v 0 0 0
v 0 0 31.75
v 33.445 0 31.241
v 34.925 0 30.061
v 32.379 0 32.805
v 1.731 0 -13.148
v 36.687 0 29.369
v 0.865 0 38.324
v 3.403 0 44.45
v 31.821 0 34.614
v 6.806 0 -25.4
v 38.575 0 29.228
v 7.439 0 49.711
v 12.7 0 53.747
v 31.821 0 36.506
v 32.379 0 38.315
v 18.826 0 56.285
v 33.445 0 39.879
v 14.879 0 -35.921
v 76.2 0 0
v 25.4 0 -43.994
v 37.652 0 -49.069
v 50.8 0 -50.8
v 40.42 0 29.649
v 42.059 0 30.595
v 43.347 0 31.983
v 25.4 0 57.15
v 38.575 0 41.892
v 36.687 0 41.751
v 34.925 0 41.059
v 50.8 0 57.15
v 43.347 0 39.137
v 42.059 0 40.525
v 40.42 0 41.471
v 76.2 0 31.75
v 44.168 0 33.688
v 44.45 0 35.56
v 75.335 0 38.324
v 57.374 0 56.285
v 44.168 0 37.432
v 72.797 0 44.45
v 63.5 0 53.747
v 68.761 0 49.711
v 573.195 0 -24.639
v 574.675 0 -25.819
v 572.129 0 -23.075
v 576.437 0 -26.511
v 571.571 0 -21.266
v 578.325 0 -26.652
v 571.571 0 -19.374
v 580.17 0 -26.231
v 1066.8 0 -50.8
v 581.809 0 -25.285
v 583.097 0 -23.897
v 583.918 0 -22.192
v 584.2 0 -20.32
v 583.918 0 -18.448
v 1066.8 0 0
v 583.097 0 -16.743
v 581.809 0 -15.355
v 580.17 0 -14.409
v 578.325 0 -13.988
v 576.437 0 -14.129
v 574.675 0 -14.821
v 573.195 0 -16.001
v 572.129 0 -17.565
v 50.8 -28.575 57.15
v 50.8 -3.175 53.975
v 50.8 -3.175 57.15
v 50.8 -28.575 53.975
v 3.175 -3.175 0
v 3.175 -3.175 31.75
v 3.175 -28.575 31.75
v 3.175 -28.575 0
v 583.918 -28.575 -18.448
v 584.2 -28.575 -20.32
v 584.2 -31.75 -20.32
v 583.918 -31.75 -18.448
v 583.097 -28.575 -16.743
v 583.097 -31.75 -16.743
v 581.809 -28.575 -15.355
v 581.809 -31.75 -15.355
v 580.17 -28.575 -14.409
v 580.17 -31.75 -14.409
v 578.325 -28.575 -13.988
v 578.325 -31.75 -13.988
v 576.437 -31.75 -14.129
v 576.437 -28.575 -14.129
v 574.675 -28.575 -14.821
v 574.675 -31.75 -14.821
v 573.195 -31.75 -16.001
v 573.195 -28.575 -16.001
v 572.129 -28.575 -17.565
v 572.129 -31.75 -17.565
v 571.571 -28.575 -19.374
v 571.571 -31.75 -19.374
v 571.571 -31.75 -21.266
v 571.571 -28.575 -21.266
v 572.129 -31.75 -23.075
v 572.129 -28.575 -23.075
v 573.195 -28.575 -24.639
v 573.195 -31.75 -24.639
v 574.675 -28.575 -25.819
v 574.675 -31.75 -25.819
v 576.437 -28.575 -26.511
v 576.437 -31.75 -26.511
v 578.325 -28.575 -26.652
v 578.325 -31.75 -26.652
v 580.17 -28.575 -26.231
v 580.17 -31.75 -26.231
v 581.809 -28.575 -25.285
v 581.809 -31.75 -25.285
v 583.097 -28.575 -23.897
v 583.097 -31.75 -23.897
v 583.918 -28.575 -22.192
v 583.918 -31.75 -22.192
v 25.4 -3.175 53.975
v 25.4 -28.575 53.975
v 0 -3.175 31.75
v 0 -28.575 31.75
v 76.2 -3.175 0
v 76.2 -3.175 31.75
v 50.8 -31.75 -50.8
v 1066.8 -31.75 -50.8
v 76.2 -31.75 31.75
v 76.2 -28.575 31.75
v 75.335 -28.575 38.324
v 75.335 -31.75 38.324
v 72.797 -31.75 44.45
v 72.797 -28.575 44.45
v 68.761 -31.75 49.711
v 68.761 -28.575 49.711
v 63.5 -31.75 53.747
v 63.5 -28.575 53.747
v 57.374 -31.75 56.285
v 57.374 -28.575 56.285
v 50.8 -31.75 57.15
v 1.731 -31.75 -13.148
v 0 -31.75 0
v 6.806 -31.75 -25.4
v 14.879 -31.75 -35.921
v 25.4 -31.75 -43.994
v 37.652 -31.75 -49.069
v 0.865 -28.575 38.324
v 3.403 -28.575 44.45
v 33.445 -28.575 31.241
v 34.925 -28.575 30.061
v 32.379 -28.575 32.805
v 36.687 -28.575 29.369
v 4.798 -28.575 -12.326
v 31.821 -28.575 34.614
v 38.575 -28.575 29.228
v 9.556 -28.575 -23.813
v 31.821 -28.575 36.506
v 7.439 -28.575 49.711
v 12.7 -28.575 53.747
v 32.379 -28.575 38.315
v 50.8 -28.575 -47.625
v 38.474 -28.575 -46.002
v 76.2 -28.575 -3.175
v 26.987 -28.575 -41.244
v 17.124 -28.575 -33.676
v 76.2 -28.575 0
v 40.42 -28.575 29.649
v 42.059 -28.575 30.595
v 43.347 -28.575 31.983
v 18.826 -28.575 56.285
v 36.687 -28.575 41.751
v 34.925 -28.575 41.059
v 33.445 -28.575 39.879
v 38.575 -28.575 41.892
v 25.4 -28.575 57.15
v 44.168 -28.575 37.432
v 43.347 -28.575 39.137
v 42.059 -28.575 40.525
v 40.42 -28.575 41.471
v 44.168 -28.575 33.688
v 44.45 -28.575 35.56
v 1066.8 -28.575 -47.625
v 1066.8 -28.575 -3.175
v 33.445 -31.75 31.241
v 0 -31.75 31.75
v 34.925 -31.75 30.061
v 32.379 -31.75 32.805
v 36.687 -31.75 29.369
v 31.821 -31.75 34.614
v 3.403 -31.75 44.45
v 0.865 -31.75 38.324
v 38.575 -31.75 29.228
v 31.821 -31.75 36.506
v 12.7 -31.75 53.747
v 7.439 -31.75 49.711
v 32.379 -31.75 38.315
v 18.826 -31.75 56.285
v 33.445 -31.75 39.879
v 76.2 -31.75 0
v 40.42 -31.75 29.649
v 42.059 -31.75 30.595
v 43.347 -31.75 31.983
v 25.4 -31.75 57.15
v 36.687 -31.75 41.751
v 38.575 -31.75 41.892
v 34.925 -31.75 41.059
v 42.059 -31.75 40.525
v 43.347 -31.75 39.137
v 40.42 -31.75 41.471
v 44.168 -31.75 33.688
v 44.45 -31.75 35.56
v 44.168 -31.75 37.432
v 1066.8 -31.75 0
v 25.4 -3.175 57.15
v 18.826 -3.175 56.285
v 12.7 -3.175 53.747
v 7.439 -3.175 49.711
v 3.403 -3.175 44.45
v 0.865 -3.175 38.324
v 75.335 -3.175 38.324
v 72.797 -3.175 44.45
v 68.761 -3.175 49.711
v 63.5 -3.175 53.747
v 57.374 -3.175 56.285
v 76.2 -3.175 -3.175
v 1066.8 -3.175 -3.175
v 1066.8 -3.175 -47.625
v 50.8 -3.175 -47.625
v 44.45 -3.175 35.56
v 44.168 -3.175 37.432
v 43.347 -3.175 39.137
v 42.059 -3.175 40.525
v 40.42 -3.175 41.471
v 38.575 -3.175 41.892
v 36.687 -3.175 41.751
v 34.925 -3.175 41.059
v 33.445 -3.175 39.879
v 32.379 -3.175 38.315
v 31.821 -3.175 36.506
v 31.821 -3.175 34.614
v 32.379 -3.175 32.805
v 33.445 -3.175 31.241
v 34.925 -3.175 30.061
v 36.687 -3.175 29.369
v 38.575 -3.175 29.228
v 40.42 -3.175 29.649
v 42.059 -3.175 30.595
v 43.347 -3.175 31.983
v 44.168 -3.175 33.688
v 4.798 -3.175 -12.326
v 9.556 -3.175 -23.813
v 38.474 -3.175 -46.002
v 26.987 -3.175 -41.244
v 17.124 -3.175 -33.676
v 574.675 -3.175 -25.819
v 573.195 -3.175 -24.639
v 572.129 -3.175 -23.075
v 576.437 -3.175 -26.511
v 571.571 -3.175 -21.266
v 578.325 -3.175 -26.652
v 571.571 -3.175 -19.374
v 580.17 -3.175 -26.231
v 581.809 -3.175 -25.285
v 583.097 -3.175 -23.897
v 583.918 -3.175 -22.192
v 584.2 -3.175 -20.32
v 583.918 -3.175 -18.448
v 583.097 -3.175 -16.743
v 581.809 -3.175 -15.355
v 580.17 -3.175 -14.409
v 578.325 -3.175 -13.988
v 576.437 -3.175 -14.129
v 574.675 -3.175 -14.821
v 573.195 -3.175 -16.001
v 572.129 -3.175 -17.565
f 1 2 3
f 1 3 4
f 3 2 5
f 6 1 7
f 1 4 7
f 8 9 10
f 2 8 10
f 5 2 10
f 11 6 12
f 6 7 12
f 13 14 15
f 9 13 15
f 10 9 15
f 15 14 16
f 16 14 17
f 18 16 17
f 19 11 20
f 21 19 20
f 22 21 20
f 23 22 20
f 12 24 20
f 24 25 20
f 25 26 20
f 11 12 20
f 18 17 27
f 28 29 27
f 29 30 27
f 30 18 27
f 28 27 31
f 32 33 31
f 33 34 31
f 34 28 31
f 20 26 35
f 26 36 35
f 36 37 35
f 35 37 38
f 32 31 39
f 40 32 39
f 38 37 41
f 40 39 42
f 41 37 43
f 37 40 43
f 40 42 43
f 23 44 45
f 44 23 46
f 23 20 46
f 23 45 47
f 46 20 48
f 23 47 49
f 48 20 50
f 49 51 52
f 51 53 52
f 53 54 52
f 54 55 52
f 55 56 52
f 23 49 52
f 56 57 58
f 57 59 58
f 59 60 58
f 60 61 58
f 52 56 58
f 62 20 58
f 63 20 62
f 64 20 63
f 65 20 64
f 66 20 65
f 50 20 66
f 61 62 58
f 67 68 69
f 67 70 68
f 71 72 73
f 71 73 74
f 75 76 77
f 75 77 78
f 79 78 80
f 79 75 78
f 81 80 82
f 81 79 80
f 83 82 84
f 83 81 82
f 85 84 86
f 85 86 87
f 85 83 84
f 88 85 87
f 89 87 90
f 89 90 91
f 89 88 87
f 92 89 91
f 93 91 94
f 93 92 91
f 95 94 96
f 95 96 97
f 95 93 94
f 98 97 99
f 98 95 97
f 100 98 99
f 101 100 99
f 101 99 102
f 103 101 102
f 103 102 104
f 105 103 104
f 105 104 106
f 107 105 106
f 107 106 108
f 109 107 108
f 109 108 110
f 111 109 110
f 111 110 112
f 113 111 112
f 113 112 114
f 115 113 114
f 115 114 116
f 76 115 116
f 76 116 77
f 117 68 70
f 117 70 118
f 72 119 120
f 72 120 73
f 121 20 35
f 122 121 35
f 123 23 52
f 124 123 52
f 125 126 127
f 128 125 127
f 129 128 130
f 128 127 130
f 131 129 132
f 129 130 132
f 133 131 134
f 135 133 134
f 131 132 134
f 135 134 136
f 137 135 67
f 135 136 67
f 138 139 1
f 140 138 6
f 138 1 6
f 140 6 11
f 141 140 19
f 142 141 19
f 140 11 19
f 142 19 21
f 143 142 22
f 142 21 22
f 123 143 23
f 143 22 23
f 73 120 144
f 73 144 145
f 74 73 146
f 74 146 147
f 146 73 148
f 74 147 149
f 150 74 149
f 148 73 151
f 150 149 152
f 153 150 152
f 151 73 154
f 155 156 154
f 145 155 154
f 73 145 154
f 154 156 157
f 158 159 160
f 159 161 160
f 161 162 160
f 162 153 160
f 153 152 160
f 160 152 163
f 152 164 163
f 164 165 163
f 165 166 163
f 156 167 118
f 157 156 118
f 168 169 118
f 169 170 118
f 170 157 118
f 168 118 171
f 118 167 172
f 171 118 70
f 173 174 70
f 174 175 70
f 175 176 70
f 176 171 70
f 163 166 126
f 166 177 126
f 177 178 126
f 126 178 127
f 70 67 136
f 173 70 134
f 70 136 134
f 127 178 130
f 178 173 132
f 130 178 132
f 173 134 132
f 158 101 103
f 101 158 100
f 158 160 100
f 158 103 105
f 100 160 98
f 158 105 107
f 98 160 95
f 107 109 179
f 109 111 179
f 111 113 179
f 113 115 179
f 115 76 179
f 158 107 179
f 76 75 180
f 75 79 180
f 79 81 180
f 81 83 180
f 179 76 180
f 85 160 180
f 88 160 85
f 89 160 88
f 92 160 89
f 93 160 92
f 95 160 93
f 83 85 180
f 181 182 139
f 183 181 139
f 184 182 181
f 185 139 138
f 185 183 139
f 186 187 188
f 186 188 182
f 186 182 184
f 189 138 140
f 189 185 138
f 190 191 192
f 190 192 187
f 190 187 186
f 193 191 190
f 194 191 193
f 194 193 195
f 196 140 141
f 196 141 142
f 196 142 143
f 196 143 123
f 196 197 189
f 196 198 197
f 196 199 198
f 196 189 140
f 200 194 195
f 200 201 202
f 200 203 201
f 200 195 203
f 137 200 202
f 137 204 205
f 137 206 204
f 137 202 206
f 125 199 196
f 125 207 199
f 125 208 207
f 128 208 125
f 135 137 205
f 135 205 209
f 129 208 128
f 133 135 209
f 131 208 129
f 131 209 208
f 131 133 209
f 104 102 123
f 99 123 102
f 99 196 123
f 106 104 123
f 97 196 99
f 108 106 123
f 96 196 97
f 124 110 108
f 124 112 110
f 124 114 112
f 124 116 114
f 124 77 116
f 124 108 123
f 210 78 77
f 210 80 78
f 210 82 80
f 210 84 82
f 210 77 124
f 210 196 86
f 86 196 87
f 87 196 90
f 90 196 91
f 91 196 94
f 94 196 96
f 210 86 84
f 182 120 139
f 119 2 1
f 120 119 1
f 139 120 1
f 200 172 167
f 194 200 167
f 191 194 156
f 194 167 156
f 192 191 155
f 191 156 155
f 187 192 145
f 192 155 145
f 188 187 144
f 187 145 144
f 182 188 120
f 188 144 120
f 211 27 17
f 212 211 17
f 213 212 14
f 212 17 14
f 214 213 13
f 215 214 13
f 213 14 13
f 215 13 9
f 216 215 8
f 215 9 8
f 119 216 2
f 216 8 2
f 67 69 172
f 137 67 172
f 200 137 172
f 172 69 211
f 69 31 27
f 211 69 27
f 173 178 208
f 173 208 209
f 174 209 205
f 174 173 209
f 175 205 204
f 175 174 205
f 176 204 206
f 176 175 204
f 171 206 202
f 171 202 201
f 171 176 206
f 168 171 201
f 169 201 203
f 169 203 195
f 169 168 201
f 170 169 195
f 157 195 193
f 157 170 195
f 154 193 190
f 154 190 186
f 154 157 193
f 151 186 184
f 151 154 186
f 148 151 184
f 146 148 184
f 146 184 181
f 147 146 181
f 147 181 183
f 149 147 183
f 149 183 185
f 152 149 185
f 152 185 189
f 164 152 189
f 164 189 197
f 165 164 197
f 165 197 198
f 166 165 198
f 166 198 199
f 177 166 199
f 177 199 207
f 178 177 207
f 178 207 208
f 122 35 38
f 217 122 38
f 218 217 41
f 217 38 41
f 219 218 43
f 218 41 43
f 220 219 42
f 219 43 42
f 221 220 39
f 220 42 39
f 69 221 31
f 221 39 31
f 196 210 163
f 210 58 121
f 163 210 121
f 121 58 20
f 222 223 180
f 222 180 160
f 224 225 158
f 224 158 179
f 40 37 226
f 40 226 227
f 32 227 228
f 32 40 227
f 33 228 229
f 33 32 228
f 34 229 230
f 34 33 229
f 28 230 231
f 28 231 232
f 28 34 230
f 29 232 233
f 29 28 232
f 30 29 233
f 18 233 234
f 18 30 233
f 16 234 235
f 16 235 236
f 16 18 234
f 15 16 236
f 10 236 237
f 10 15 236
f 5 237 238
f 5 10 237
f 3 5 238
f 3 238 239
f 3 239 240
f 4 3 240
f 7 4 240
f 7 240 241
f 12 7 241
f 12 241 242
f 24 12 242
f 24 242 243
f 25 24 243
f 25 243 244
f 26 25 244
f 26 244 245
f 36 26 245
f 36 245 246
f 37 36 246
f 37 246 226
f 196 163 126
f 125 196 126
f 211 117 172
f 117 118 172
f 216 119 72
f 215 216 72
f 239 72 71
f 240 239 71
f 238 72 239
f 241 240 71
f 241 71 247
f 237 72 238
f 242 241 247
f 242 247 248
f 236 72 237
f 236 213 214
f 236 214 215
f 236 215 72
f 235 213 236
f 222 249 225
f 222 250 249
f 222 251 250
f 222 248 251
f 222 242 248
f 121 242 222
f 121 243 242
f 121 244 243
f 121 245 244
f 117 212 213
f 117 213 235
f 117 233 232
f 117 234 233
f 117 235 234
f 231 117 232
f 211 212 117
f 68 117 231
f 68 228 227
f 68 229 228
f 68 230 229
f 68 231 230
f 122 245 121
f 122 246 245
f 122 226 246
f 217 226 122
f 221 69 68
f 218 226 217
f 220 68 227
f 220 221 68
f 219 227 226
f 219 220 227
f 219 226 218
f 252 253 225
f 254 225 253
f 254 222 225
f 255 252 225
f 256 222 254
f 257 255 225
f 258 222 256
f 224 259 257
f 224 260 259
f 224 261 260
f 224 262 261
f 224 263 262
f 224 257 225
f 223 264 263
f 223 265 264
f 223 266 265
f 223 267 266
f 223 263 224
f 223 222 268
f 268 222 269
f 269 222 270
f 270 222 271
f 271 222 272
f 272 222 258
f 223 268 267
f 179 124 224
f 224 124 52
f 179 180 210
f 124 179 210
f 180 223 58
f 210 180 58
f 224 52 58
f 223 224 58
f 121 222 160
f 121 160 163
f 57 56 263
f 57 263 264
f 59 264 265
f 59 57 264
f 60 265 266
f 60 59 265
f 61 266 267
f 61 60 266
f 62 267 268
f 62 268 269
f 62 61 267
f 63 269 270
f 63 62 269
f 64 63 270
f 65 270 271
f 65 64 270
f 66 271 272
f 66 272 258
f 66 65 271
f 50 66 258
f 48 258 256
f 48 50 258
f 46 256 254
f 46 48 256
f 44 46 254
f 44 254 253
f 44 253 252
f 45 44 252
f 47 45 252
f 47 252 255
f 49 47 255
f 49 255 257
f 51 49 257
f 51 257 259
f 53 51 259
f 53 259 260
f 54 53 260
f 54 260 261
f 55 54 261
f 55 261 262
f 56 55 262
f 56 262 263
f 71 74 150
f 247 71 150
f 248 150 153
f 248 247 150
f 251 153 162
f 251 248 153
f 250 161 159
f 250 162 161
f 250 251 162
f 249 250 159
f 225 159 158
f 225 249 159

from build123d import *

# Parameters (mm, degrees)
F0_R     = 6.35
F1_DEPTH = 31.75
F2_T     = 3.175


# Not quite as in the source:
# - a shell that OpenCascade refuses in one call is made with other operations: the cavity is built on its own and cut out


with BuildPart() as f1:
    # F0 (on Front) → F1 (new body)
    with BuildSketch(Plane.XZ):
        with BuildLine():
            Line((1066.8, 0), (76.2, 0))
            Line((76.2, 0), (76.2, 31.75))
            ThreePointArc((76.2, 31.75), (68.7605122421, 49.7105122421), (50.8, 57.15))
            Line((50.8, 57.15), (25.4, 57.15))
            ThreePointArc((25.4, 57.15), (7.4394877579, 49.7105122421), (0, 31.75))
            Line((0, 31.75), (0, 0))
            ThreePointArc((0, 0), (14.8789755157, -35.9210244843), (50.8, -50.8))
            Line((50.8, -50.8), (1066.8, -50.8))
            Line((1066.8, -50.8), (1066.8, 0))
        make_face()
        with Locations((577.85, -20.32)):
            Circle(F0_R, mode=Mode.SUBTRACT)
        with Locations((38.1, 35.56)):
            Circle(F0_R, mode=Mode.SUBTRACT)
    extrude(amount=F1_DEPTH)

    # F2: shell of thickness 3.175, made by hand


with BuildPart() as f2_core1:
    # F2_t2: copy of F1
    add(f1.part)

    # the walls: a layer under each face that stays
    f2_faces = [f2_core1.faces().sort_by_distance(p)[0] for p in [
        (571.5, -15.875, 0),
        (38.1, -15.875, 57.15),
        (0, -15.875, 15.875),
        (14.8789755157, -15.875, -35.9210244843),
        (558.8, -15.875, -50.8),
        (177.8, 0, -32.8083333333),
        (177.8, -31.75, -32.8083333333),
    ]]
    thicken(f2_faces, amount=-F2_T, mode=Mode.SUBTRACT)


with BuildPart() as f1_1:
    add(f1.part)

    # what is left inside the walls is the cavity
    f2_cavity = [f2_core1.part.solids().sort_by_distance(p)[0] for p in [
        (533.4, -28.54325, -12.7),
    ]]
    add(f2_cavity, mode=Mode.SUBTRACT)


solid = f1_1.part
